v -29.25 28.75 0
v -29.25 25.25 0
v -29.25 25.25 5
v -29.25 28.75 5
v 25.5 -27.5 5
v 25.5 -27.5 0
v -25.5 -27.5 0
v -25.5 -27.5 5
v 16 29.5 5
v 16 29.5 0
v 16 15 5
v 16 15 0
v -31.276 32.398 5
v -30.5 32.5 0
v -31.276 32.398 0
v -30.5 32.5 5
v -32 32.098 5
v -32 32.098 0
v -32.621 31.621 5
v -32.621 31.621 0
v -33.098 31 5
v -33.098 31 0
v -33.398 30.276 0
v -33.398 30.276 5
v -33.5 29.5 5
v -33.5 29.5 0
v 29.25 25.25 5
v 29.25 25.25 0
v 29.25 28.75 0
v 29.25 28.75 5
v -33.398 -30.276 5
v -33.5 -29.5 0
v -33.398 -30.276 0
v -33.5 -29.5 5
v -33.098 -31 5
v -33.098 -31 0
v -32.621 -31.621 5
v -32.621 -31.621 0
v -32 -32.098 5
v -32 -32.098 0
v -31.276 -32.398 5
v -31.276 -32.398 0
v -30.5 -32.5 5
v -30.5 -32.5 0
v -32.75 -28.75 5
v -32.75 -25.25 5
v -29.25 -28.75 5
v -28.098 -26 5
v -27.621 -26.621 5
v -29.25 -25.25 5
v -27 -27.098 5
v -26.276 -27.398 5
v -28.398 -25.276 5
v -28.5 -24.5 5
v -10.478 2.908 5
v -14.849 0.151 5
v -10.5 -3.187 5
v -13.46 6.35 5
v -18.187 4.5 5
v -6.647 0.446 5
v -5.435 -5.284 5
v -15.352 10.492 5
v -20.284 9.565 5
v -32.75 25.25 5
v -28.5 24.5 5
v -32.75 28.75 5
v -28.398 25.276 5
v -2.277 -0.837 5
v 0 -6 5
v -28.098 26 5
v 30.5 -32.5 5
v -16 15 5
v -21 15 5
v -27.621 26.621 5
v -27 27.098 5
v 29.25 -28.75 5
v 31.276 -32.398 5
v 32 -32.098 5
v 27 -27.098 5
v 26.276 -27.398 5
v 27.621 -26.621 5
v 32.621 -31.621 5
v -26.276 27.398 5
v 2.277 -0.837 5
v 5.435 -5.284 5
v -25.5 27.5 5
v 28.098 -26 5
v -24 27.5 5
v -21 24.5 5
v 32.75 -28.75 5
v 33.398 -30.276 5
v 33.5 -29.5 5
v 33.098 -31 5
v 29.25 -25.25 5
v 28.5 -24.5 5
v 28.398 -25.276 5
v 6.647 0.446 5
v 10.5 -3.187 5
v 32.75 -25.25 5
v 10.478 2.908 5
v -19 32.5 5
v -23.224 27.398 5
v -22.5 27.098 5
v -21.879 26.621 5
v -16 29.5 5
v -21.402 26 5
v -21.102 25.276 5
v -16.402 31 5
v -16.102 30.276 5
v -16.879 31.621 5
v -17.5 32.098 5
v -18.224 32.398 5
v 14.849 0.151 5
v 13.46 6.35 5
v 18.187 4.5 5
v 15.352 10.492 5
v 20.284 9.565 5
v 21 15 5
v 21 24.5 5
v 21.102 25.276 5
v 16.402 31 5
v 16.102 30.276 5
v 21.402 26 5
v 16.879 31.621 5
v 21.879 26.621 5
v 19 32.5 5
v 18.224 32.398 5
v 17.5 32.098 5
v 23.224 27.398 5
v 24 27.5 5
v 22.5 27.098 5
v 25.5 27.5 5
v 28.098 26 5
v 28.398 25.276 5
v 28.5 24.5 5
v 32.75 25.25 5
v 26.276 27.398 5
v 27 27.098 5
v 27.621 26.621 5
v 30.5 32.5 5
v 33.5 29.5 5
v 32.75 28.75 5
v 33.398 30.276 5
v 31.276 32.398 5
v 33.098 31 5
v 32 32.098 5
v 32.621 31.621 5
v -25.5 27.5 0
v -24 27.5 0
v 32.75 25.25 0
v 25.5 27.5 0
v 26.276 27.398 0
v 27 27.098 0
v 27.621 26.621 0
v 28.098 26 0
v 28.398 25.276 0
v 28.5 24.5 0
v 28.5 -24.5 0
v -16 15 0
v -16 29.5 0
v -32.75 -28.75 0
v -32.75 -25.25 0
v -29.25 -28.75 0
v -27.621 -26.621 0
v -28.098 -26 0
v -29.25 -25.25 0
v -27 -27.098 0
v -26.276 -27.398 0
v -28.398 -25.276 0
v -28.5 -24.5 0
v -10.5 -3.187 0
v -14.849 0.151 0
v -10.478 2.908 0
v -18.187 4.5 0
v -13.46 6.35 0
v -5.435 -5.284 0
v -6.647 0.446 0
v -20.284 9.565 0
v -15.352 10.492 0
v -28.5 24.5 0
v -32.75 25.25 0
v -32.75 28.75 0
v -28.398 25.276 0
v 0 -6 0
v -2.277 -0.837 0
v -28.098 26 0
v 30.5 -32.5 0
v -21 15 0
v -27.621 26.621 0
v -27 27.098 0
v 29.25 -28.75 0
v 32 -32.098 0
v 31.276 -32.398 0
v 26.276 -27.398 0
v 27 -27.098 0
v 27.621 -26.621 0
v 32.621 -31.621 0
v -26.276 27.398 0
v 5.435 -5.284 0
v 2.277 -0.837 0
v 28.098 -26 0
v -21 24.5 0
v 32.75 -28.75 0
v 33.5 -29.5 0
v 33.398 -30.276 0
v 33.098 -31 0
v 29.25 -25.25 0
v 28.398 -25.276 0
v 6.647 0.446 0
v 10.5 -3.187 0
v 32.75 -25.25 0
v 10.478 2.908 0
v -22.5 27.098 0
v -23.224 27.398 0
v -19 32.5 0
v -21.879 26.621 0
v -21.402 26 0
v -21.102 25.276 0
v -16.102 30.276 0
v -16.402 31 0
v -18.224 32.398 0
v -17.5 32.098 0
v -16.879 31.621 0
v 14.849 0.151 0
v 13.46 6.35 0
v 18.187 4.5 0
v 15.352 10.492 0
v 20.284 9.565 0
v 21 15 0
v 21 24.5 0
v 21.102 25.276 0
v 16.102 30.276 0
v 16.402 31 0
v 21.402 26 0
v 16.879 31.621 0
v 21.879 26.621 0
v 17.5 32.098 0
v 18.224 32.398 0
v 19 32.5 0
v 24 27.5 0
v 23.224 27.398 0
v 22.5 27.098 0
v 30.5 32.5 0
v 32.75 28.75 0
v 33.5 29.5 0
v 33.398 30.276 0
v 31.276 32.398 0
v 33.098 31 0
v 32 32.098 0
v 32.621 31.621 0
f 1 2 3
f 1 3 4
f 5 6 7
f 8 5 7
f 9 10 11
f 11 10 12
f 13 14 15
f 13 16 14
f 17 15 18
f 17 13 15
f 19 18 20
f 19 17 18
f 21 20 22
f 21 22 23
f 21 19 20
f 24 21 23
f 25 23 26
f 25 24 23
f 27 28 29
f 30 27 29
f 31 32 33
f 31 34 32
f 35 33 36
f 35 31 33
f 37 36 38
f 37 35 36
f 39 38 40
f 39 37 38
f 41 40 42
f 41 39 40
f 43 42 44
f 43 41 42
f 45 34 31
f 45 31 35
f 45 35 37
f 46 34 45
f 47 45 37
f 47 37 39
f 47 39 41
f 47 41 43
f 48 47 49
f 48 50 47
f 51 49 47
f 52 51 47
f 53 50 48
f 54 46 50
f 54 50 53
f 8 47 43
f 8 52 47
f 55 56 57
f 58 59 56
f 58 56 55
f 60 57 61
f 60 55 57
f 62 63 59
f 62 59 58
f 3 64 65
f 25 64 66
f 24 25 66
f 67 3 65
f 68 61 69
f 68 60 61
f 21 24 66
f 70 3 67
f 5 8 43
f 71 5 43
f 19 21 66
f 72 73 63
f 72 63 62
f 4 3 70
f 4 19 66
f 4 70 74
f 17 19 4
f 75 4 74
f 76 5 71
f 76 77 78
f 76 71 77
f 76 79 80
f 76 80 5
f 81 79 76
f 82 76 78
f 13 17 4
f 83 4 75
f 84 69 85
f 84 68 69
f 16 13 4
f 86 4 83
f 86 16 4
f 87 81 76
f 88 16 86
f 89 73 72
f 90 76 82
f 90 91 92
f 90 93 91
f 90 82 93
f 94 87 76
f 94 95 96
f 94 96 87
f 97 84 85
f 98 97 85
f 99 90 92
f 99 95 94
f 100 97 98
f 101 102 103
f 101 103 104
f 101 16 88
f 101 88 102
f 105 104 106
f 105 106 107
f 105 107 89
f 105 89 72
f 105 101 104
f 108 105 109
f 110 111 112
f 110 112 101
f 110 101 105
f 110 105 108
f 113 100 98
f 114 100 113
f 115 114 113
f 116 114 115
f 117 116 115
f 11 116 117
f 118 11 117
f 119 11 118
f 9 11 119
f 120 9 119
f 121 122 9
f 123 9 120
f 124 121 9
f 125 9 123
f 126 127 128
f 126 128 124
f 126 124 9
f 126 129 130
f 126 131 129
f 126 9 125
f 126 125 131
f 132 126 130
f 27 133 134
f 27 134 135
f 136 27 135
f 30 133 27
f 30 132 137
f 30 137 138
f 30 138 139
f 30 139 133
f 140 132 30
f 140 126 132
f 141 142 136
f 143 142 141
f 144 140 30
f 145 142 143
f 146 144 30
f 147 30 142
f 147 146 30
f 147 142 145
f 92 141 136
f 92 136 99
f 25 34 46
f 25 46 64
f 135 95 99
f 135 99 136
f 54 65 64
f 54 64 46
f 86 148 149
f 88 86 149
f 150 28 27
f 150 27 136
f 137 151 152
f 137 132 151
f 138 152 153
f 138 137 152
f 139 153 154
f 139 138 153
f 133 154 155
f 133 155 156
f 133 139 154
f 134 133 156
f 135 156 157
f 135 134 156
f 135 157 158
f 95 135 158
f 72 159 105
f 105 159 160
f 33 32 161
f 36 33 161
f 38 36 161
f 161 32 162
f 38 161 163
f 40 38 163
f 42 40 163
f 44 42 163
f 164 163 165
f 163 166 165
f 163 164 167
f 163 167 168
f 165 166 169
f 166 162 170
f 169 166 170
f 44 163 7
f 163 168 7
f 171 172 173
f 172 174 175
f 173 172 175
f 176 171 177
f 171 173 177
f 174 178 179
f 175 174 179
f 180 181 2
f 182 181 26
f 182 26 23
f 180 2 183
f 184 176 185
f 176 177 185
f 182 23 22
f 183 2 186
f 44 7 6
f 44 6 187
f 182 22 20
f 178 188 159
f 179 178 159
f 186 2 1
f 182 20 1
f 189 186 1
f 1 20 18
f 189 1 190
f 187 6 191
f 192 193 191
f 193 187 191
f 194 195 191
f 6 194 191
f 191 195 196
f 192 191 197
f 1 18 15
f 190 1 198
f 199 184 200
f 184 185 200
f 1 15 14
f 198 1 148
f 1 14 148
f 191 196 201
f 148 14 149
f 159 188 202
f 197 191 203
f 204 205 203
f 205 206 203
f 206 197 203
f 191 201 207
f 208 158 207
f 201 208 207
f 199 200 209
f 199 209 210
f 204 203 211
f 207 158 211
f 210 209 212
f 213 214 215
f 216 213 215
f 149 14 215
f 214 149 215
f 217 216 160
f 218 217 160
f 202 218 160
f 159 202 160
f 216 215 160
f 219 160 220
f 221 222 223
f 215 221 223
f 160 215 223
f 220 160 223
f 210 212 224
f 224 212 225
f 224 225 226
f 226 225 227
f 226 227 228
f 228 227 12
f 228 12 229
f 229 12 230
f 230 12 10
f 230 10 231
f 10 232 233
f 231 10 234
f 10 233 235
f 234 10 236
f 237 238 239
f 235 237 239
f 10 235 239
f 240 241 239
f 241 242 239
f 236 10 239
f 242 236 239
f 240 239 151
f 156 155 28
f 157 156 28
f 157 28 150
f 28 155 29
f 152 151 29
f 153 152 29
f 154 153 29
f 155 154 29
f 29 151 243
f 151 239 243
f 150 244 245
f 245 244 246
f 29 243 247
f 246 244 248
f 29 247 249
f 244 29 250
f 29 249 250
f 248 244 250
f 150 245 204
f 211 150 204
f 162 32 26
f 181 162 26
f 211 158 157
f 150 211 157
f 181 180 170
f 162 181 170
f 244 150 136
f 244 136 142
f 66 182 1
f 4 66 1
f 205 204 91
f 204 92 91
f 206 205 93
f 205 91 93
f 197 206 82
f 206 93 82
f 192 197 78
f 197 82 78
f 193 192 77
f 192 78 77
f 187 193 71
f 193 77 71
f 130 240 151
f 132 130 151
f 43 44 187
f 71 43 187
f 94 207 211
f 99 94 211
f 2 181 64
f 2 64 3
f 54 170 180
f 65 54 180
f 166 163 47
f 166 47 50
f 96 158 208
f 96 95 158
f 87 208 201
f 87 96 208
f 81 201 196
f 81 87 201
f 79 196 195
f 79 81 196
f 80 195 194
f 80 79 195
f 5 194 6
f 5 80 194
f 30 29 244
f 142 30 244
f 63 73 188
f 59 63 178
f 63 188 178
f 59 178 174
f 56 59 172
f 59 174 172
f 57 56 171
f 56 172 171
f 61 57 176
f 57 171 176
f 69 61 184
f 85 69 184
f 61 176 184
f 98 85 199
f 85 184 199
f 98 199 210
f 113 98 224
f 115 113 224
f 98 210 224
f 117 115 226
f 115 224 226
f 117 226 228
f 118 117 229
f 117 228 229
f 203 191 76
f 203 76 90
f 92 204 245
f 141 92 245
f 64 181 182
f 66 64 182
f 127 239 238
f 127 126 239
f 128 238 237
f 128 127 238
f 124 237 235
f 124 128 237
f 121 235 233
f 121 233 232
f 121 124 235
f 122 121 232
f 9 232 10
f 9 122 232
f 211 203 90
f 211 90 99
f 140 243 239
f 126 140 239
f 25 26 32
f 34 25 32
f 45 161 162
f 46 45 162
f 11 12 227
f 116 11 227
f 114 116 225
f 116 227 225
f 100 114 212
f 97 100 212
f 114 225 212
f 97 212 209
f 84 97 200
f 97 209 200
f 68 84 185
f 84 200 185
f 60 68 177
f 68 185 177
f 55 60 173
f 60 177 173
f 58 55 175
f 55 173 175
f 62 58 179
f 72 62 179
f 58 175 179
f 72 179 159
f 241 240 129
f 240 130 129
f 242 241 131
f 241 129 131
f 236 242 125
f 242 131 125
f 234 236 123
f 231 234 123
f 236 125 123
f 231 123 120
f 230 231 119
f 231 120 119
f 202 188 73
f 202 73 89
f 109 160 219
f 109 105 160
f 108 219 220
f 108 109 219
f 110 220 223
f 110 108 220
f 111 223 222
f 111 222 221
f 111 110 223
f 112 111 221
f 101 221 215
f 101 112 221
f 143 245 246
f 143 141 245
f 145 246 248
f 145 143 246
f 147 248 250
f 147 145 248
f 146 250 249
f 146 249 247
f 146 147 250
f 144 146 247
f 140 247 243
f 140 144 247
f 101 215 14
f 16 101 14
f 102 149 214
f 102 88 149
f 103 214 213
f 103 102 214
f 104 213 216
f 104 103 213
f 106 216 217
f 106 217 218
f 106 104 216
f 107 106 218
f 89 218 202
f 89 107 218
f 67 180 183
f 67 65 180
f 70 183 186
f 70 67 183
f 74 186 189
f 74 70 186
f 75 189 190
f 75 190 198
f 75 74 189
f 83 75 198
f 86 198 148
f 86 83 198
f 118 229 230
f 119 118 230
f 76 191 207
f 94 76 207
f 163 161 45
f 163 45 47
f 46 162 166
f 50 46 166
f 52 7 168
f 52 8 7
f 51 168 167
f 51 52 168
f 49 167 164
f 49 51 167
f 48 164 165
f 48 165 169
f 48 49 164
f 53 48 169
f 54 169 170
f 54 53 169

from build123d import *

# Parameters (mm, degrees)
F0_W     = 3.5
F0_H     = 3.5
F0_W_2   = 5
F0_H_2   = 12.5
F1_DEPTH = 5
F2_R     = 3


with BuildPart() as f1:
    # F0 (on Top) → F1 (new body)
    with BuildSketch(Plane.XY):
        Polygon((33.5, -32.5), (33.5, 32.5), (16, 32.5), (16, 27.5), (21, 27.5), (28.5, 27.5), (28.5, -27.5), (-28.5, -27.5), (-28.5, 27.5), (-21, 27.5), (-16, 27.5), (-16, 32.5), (-33.5, 32.5), (-33.5, -32.5), align=None)
        with Locations((-31, -27)):
            Rectangle(F0_W, F0_H, mode=Mode.SUBTRACT)
        with Locations((31, -27)):
            Rectangle(F0_W, F0_H, mode=Mode.SUBTRACT)
        with Locations((-31, 27)):
            Rectangle(F0_W, F0_H, mode=Mode.SUBTRACT)
        with Locations((31, 27)):
            Rectangle(F0_W, F0_H, mode=Mode.SUBTRACT)
        with Locations((-18.5, 21.25)):
            Rectangle(F0_W_2, F0_H_2)
        with BuildLine():
            Line((21, 15), (16, 15))
            ThreePointArc((16, 15), (0, -1), (-16, 15))
            Line((-16, 15), (-21, 15))
            ThreePointArc((-21, 15), (0, -6), (21, 15))
        make_face()
        with Locations((18.5, 21.25)):
            Rectangle(F0_W_2, F0_H_2)
    extrude(amount=F1_DEPTH)

    # F2
    f2_edges = [f1.edges().sort_by_distance(p)[0] for p in [
        (-33.5, 32.5, 2.5),
        (-16, 32.5, 2.5),
        (16, 32.5, 2.5),
        (33.5, 32.5, 2.5),
        (-28.5, 27.5, 2.5),
        (-21, 27.5, 2.5),
        (21, 27.5, 2.5),
        (28.5, 27.5, 2.5),
        (28.5, -27.5, 2.5),
        (-28.5, -27.5, 2.5),
        (33.5, -32.5, 2.5),
        (-33.5, -32.5, 2.5),
    ]]
    fillet(f2_edges, radius=F2_R)


solid = f1.part
